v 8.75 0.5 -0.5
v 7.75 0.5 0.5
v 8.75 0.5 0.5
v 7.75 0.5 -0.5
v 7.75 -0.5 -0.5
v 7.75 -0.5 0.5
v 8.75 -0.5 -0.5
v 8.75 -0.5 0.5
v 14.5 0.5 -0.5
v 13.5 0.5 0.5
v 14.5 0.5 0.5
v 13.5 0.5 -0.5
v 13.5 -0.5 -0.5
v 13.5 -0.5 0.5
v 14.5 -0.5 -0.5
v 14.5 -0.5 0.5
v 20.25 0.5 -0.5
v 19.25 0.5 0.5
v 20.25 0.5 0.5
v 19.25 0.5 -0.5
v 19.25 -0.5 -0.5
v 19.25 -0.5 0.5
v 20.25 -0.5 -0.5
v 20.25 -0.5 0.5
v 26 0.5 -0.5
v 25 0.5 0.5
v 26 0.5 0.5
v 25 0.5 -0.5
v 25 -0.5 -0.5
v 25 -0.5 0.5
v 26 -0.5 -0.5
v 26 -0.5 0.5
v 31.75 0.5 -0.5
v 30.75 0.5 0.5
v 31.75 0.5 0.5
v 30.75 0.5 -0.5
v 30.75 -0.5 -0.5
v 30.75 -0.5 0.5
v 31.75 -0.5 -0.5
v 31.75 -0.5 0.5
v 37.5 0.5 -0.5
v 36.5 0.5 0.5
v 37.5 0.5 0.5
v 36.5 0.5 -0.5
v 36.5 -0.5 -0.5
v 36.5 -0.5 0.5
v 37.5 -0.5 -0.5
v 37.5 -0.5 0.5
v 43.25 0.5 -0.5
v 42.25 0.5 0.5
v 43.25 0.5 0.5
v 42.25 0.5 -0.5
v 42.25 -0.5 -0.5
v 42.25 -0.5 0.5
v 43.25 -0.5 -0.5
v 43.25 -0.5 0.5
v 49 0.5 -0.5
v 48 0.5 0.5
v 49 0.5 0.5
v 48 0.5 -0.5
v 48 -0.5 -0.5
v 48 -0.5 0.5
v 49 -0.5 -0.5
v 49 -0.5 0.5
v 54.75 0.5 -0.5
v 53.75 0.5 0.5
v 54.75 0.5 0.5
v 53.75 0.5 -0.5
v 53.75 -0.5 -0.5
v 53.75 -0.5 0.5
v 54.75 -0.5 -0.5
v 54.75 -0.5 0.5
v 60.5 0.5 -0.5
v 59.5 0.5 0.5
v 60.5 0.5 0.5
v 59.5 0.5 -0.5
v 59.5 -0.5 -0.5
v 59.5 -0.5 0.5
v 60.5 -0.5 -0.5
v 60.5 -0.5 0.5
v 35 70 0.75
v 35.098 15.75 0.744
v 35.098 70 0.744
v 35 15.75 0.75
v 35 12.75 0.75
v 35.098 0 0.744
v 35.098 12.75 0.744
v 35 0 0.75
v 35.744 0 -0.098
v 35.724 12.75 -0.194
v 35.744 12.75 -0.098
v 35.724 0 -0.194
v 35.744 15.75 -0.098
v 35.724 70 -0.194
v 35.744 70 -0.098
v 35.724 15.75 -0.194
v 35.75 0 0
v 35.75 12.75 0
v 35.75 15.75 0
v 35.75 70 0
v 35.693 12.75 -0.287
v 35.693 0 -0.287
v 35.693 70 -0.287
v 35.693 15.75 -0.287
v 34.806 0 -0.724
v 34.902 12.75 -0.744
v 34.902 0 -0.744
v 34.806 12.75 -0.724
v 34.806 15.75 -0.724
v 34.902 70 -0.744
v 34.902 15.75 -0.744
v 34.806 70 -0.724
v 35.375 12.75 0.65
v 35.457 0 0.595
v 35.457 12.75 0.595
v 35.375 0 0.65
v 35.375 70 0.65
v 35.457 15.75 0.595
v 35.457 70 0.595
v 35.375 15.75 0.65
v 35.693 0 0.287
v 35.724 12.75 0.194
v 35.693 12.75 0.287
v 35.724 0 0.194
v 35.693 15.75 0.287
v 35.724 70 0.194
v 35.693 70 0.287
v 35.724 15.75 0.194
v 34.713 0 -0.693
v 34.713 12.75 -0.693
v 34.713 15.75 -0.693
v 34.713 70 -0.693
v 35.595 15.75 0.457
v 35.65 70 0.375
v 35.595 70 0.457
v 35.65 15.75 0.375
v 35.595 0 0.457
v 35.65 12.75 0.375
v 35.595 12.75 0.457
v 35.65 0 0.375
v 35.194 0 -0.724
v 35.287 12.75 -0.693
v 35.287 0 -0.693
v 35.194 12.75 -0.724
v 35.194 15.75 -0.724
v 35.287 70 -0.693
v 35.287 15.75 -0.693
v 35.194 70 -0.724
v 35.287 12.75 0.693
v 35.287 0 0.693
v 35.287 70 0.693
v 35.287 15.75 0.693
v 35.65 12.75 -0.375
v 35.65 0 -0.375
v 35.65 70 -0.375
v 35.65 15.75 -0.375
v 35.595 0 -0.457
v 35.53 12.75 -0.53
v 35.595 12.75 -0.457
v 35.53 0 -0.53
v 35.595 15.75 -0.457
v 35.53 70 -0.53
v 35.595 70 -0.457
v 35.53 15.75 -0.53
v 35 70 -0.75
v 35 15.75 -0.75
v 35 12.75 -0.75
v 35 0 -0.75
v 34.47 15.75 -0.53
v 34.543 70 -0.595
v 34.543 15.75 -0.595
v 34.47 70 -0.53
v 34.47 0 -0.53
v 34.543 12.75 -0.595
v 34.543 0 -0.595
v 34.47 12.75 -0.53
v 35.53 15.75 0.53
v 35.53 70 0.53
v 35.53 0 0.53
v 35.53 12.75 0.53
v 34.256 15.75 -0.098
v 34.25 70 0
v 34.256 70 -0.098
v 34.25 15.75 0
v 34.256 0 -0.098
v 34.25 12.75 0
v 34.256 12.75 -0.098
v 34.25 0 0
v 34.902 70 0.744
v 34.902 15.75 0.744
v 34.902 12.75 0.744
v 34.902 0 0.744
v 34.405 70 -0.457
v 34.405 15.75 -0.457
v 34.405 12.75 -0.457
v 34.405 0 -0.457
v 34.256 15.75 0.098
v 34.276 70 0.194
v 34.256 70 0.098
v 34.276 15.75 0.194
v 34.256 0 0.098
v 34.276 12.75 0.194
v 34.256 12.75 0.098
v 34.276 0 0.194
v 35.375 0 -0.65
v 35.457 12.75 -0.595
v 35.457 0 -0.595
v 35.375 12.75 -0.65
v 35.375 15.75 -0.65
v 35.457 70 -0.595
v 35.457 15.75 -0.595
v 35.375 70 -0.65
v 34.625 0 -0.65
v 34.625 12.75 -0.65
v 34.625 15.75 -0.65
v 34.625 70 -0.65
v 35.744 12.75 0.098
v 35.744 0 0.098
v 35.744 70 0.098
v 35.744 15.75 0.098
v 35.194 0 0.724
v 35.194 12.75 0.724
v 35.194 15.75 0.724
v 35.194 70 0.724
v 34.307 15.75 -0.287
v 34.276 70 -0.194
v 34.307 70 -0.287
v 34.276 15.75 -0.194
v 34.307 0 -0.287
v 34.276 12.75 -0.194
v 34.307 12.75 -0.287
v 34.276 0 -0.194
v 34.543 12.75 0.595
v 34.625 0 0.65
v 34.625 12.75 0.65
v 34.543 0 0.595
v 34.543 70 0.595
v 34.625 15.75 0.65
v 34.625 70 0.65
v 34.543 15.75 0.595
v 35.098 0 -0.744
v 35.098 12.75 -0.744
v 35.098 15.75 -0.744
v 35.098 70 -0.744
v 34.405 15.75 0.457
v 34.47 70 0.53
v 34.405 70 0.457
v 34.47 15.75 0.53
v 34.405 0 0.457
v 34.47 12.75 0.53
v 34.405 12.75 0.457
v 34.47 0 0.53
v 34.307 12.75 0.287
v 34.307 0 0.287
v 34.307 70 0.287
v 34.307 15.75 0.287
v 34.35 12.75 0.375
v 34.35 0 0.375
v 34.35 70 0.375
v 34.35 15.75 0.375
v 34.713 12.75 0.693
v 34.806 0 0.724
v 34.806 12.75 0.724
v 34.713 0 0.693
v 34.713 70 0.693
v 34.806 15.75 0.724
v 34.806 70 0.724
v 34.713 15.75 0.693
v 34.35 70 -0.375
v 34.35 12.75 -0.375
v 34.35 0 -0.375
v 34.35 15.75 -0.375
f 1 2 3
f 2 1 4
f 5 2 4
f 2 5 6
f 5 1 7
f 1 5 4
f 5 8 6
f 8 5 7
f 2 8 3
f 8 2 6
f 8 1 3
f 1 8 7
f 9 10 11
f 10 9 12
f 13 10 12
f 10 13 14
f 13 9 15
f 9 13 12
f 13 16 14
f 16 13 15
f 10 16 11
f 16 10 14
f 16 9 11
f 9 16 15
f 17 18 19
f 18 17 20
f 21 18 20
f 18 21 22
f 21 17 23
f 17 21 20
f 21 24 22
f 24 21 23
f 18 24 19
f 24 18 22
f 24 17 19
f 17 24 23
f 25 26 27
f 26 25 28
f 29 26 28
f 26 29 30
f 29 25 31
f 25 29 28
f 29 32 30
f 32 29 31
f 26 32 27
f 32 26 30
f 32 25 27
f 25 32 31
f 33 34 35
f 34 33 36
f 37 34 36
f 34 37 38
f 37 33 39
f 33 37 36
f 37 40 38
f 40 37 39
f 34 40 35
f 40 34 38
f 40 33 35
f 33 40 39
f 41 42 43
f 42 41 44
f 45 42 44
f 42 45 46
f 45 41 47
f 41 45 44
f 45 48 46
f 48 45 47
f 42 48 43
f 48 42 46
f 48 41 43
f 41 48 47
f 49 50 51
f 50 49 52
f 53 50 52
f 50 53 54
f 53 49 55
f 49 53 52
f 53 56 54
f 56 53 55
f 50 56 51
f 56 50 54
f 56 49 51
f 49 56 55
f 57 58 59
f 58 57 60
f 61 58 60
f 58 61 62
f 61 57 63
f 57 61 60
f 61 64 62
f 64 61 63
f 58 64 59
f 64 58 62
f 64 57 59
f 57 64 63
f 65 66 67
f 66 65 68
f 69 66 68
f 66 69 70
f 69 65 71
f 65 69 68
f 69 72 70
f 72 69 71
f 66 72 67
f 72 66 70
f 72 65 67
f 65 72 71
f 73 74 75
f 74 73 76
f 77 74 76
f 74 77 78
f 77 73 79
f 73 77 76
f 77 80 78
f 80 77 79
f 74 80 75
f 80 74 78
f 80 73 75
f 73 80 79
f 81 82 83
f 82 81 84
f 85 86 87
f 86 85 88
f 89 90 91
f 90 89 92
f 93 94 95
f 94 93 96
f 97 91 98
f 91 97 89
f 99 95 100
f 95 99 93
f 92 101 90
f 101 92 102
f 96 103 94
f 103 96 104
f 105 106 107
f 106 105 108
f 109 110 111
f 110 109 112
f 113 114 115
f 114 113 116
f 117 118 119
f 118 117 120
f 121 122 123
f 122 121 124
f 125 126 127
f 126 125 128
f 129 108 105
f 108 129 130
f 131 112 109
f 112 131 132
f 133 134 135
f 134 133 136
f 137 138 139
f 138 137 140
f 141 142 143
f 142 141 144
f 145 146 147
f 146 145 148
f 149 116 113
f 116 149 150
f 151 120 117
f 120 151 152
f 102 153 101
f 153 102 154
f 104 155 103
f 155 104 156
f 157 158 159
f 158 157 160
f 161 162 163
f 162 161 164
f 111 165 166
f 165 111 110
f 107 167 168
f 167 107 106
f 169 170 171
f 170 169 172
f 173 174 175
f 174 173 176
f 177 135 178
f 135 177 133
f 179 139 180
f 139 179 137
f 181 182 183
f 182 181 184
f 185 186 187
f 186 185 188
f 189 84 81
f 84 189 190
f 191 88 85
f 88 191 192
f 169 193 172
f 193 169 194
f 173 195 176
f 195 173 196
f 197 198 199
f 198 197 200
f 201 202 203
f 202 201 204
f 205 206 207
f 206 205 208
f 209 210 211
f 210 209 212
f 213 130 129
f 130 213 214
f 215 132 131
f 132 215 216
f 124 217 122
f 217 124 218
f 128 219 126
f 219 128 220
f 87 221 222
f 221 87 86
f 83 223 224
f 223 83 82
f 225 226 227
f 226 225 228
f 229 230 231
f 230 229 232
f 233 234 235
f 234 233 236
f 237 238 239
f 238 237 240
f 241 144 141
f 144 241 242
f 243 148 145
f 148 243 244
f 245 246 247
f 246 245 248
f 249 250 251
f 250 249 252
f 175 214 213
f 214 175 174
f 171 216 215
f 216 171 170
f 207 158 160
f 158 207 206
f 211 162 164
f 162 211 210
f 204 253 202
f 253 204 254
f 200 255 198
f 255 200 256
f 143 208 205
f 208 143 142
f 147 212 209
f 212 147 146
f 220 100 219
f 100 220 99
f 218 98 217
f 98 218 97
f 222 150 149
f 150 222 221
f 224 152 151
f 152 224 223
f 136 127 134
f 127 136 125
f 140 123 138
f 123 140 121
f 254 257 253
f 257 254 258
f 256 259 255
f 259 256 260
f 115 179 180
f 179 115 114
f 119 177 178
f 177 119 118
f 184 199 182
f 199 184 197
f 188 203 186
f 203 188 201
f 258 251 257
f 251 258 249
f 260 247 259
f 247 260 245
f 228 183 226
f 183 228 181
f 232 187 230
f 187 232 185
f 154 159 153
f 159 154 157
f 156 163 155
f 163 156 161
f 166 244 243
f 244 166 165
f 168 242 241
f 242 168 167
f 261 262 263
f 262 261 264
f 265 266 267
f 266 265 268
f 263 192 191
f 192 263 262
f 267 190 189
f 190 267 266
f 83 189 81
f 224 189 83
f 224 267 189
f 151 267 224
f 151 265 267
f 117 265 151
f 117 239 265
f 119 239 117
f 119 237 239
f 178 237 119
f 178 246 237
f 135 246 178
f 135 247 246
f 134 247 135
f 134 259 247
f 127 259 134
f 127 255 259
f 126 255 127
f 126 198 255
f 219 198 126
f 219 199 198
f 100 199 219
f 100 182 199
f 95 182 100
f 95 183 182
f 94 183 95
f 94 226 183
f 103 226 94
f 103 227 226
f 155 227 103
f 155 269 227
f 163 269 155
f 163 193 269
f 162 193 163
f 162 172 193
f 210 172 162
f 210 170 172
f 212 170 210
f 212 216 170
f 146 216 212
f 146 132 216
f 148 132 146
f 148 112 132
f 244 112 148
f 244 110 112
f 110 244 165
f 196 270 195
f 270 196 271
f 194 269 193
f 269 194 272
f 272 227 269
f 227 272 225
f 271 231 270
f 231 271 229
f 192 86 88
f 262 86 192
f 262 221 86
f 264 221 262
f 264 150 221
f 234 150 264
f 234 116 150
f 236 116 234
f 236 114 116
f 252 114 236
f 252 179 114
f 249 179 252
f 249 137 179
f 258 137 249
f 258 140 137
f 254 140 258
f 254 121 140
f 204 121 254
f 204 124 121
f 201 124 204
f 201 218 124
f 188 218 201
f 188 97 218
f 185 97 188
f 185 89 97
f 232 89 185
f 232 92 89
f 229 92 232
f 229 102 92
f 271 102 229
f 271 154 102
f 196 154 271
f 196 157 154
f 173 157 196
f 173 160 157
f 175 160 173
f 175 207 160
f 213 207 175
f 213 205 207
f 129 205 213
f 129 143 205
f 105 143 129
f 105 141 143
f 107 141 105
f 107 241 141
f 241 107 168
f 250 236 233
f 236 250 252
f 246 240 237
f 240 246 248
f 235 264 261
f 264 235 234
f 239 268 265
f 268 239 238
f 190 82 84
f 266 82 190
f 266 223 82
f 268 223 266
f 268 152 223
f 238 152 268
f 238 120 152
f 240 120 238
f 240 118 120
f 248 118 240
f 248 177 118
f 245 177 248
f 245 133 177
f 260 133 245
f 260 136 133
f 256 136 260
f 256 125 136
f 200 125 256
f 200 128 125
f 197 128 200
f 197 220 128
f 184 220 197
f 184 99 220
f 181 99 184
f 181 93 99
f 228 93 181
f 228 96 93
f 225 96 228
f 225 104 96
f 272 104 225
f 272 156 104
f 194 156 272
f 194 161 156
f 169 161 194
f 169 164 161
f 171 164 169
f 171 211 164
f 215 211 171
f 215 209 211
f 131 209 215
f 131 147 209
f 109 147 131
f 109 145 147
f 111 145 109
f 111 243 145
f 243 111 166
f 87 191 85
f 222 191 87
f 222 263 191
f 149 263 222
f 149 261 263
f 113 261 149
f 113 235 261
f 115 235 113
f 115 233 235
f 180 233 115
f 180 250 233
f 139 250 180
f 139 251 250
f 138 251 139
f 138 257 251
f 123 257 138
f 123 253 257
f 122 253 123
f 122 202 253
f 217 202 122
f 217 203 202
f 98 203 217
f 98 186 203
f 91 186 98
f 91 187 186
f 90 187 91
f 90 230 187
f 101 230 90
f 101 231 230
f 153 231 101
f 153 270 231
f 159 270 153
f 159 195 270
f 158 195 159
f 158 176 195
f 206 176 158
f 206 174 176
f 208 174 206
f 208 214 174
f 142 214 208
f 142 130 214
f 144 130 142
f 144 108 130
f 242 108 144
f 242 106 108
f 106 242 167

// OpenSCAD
// Agarose gel comb - a flat plate with a back bar and a row of rectangular teeth for casting
// horizontal gels. NOVEL general part, printed lying flat on the bed.
//

teeth = 10;
bar   = 70;
t     = 1.5;
g     = 1.5;
w     = 5;
l     = 12;

$fn = 48;

teeth_size = [w, l];
gap         = [g, 0];
base        = [bar, l + 1.5];                 // the back bar (spine)
projection  = [w + g, l];                     // one tooth plus its following gap

difference() {
    union() {
        translate([bar / 2, 0, 0]) rotate([-90, 0, 0]) cylinder(h = bar, d = t);           // back bar (spine)
        for (i = [0 : teeth - 1])
            translate([bar / 2 - (w + g) * teeth / 2 + (w + g / 2) * (i + 1), 0, 0])
                rotate([-90, 0, 0]) cube(teeth_size, center = true);                         // teeth
    }
    for (i = [0 : teeth - 1])
        translate([bar / 2 - (w + g) * teeth / 2 + (w + g / 2) * (i + 1), l + 0.75, 0])
            rotate([-90, 0, 0]) cylinder(h = t + 1.5, d = w + g);                           // empty below each tooth
}
